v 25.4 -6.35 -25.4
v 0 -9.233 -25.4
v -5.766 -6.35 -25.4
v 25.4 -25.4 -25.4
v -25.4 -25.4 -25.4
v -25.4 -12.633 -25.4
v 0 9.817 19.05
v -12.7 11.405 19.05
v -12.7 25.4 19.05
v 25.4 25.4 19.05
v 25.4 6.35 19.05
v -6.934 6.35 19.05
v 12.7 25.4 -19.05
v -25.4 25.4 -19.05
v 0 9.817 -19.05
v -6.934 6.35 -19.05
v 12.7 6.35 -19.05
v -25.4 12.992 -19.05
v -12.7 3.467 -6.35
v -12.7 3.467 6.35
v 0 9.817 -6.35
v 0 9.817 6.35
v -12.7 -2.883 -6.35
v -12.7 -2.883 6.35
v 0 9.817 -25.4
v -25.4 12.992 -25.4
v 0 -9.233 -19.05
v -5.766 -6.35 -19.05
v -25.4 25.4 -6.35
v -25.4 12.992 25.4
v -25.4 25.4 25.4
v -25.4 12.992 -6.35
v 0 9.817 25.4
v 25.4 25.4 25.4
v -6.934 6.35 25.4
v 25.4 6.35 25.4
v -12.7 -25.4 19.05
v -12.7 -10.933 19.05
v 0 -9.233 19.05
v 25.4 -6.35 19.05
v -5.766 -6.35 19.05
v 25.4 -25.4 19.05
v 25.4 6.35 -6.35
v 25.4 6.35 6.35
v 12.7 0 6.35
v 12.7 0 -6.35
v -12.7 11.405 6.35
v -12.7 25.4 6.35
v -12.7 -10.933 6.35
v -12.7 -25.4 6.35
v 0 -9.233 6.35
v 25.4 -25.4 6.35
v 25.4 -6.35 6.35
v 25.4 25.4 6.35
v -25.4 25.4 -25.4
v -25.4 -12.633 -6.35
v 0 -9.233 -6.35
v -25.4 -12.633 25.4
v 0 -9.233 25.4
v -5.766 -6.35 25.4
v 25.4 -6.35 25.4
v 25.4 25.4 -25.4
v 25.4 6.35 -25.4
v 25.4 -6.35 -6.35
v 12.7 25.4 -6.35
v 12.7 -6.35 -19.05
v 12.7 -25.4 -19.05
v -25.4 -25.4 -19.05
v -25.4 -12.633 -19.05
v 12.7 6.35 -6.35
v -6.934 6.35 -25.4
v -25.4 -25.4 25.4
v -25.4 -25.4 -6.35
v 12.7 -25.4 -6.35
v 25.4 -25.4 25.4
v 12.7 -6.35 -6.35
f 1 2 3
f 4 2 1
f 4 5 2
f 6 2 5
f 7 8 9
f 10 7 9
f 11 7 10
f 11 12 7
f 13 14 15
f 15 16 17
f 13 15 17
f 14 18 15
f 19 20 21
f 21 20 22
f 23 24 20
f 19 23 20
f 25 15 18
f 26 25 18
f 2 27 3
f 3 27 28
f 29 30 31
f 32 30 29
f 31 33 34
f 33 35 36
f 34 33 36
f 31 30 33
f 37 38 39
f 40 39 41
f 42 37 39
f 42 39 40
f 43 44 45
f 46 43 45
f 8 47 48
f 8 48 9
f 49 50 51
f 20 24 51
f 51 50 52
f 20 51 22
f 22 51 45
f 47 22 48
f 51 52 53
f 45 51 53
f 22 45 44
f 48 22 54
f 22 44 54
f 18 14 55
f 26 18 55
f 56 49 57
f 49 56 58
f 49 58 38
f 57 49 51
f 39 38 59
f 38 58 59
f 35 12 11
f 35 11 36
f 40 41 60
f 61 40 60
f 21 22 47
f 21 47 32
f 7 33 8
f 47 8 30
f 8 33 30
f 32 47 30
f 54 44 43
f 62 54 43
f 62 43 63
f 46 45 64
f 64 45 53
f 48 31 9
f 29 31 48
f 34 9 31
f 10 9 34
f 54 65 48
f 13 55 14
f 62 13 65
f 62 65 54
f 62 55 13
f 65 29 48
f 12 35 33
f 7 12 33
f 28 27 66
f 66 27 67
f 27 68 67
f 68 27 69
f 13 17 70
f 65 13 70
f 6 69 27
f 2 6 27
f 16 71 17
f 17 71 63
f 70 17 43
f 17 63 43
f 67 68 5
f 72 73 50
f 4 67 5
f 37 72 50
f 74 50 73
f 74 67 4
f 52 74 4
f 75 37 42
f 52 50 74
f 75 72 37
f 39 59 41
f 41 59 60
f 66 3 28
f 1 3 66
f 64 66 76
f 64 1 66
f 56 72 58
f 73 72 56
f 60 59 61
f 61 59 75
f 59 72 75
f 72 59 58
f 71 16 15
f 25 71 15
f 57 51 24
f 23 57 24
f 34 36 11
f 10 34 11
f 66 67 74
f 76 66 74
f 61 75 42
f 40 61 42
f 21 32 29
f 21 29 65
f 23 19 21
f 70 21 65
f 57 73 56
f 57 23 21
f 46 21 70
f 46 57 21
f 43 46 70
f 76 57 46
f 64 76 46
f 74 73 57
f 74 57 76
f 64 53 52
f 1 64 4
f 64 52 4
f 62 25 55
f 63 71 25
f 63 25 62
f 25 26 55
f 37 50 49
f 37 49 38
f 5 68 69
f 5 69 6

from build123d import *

# Parameters (mm, degrees)
F3_W      = 50.8
F3_H      = 50.8
F4_DEPTH  = 25.4
F4_FACE_W = 50.8
F4_FACE_H = 50.8
F5_DEPTH  = 25.4
F6_W      = 38.1
F6_H      = 12.7
F7_DEPTH  = 76.2
F8_W      = 12.7
F8_H      = 19.05
F9_DEPTH  = 76.2
F11_DEPTH = 76.2


with BuildPart() as f4:
    # F3 (on Front) → F4 (new body)
    with BuildSketch(Plane.XZ):
        Rectangle(F3_W, F3_H)
    extrude(amount=F4_DEPTH)

    # F4_face (on face) → F5 (join)
    with BuildSketch(Plane(origin=(0, 0, 0), x_dir=(1, 0, 0), z_dir=(0, 1, 0))):
        Rectangle(F4_FACE_W, F4_FACE_H)
    extrude(amount=F5_DEPTH)

    # F6 (on offset) → F7 (cut)
    with BuildSketch(Plane.XZ.offset(50.8)):
        with Locations((6.35, 12.7)):
            Rectangle(F6_W, F6_H)
        with Locations((-6.35, -12.7)):
            Rectangle(F6_W, F6_H)
    extrude(amount=-F7_DEPTH, mode=Mode.SUBTRACT)

    # F8 (on offset) → F9 (cut)
    with BuildSketch(Plane.YZ.offset(50.8)):
        with Locations((0, 15.875)):
            Rectangle(F8_W, F8_H)
        with Locations((0, -15.875)):
            Rectangle(F8_W, F8_H)
    extrude(amount=-F9_DEPTH, mode=Mode.SUBTRACT)

    # F10 (on offset) → F11 (cut)
    with BuildSketch(Plane.XY.offset(50.8)):
        Polygon((25.4, -6.35), (25.4, 6.35), (12.7, 0), align=None)
        Polygon((0, 9.817213), (-25.4, 12.992213), (-25.4, -12.633159), (0, -9.232787), (-12.7, -2.882787), (-12.7, 3.467213), align=None)
    extrude(amount=-F11_DEPTH, mode=Mode.SUBTRACT)


solid = f4.part
